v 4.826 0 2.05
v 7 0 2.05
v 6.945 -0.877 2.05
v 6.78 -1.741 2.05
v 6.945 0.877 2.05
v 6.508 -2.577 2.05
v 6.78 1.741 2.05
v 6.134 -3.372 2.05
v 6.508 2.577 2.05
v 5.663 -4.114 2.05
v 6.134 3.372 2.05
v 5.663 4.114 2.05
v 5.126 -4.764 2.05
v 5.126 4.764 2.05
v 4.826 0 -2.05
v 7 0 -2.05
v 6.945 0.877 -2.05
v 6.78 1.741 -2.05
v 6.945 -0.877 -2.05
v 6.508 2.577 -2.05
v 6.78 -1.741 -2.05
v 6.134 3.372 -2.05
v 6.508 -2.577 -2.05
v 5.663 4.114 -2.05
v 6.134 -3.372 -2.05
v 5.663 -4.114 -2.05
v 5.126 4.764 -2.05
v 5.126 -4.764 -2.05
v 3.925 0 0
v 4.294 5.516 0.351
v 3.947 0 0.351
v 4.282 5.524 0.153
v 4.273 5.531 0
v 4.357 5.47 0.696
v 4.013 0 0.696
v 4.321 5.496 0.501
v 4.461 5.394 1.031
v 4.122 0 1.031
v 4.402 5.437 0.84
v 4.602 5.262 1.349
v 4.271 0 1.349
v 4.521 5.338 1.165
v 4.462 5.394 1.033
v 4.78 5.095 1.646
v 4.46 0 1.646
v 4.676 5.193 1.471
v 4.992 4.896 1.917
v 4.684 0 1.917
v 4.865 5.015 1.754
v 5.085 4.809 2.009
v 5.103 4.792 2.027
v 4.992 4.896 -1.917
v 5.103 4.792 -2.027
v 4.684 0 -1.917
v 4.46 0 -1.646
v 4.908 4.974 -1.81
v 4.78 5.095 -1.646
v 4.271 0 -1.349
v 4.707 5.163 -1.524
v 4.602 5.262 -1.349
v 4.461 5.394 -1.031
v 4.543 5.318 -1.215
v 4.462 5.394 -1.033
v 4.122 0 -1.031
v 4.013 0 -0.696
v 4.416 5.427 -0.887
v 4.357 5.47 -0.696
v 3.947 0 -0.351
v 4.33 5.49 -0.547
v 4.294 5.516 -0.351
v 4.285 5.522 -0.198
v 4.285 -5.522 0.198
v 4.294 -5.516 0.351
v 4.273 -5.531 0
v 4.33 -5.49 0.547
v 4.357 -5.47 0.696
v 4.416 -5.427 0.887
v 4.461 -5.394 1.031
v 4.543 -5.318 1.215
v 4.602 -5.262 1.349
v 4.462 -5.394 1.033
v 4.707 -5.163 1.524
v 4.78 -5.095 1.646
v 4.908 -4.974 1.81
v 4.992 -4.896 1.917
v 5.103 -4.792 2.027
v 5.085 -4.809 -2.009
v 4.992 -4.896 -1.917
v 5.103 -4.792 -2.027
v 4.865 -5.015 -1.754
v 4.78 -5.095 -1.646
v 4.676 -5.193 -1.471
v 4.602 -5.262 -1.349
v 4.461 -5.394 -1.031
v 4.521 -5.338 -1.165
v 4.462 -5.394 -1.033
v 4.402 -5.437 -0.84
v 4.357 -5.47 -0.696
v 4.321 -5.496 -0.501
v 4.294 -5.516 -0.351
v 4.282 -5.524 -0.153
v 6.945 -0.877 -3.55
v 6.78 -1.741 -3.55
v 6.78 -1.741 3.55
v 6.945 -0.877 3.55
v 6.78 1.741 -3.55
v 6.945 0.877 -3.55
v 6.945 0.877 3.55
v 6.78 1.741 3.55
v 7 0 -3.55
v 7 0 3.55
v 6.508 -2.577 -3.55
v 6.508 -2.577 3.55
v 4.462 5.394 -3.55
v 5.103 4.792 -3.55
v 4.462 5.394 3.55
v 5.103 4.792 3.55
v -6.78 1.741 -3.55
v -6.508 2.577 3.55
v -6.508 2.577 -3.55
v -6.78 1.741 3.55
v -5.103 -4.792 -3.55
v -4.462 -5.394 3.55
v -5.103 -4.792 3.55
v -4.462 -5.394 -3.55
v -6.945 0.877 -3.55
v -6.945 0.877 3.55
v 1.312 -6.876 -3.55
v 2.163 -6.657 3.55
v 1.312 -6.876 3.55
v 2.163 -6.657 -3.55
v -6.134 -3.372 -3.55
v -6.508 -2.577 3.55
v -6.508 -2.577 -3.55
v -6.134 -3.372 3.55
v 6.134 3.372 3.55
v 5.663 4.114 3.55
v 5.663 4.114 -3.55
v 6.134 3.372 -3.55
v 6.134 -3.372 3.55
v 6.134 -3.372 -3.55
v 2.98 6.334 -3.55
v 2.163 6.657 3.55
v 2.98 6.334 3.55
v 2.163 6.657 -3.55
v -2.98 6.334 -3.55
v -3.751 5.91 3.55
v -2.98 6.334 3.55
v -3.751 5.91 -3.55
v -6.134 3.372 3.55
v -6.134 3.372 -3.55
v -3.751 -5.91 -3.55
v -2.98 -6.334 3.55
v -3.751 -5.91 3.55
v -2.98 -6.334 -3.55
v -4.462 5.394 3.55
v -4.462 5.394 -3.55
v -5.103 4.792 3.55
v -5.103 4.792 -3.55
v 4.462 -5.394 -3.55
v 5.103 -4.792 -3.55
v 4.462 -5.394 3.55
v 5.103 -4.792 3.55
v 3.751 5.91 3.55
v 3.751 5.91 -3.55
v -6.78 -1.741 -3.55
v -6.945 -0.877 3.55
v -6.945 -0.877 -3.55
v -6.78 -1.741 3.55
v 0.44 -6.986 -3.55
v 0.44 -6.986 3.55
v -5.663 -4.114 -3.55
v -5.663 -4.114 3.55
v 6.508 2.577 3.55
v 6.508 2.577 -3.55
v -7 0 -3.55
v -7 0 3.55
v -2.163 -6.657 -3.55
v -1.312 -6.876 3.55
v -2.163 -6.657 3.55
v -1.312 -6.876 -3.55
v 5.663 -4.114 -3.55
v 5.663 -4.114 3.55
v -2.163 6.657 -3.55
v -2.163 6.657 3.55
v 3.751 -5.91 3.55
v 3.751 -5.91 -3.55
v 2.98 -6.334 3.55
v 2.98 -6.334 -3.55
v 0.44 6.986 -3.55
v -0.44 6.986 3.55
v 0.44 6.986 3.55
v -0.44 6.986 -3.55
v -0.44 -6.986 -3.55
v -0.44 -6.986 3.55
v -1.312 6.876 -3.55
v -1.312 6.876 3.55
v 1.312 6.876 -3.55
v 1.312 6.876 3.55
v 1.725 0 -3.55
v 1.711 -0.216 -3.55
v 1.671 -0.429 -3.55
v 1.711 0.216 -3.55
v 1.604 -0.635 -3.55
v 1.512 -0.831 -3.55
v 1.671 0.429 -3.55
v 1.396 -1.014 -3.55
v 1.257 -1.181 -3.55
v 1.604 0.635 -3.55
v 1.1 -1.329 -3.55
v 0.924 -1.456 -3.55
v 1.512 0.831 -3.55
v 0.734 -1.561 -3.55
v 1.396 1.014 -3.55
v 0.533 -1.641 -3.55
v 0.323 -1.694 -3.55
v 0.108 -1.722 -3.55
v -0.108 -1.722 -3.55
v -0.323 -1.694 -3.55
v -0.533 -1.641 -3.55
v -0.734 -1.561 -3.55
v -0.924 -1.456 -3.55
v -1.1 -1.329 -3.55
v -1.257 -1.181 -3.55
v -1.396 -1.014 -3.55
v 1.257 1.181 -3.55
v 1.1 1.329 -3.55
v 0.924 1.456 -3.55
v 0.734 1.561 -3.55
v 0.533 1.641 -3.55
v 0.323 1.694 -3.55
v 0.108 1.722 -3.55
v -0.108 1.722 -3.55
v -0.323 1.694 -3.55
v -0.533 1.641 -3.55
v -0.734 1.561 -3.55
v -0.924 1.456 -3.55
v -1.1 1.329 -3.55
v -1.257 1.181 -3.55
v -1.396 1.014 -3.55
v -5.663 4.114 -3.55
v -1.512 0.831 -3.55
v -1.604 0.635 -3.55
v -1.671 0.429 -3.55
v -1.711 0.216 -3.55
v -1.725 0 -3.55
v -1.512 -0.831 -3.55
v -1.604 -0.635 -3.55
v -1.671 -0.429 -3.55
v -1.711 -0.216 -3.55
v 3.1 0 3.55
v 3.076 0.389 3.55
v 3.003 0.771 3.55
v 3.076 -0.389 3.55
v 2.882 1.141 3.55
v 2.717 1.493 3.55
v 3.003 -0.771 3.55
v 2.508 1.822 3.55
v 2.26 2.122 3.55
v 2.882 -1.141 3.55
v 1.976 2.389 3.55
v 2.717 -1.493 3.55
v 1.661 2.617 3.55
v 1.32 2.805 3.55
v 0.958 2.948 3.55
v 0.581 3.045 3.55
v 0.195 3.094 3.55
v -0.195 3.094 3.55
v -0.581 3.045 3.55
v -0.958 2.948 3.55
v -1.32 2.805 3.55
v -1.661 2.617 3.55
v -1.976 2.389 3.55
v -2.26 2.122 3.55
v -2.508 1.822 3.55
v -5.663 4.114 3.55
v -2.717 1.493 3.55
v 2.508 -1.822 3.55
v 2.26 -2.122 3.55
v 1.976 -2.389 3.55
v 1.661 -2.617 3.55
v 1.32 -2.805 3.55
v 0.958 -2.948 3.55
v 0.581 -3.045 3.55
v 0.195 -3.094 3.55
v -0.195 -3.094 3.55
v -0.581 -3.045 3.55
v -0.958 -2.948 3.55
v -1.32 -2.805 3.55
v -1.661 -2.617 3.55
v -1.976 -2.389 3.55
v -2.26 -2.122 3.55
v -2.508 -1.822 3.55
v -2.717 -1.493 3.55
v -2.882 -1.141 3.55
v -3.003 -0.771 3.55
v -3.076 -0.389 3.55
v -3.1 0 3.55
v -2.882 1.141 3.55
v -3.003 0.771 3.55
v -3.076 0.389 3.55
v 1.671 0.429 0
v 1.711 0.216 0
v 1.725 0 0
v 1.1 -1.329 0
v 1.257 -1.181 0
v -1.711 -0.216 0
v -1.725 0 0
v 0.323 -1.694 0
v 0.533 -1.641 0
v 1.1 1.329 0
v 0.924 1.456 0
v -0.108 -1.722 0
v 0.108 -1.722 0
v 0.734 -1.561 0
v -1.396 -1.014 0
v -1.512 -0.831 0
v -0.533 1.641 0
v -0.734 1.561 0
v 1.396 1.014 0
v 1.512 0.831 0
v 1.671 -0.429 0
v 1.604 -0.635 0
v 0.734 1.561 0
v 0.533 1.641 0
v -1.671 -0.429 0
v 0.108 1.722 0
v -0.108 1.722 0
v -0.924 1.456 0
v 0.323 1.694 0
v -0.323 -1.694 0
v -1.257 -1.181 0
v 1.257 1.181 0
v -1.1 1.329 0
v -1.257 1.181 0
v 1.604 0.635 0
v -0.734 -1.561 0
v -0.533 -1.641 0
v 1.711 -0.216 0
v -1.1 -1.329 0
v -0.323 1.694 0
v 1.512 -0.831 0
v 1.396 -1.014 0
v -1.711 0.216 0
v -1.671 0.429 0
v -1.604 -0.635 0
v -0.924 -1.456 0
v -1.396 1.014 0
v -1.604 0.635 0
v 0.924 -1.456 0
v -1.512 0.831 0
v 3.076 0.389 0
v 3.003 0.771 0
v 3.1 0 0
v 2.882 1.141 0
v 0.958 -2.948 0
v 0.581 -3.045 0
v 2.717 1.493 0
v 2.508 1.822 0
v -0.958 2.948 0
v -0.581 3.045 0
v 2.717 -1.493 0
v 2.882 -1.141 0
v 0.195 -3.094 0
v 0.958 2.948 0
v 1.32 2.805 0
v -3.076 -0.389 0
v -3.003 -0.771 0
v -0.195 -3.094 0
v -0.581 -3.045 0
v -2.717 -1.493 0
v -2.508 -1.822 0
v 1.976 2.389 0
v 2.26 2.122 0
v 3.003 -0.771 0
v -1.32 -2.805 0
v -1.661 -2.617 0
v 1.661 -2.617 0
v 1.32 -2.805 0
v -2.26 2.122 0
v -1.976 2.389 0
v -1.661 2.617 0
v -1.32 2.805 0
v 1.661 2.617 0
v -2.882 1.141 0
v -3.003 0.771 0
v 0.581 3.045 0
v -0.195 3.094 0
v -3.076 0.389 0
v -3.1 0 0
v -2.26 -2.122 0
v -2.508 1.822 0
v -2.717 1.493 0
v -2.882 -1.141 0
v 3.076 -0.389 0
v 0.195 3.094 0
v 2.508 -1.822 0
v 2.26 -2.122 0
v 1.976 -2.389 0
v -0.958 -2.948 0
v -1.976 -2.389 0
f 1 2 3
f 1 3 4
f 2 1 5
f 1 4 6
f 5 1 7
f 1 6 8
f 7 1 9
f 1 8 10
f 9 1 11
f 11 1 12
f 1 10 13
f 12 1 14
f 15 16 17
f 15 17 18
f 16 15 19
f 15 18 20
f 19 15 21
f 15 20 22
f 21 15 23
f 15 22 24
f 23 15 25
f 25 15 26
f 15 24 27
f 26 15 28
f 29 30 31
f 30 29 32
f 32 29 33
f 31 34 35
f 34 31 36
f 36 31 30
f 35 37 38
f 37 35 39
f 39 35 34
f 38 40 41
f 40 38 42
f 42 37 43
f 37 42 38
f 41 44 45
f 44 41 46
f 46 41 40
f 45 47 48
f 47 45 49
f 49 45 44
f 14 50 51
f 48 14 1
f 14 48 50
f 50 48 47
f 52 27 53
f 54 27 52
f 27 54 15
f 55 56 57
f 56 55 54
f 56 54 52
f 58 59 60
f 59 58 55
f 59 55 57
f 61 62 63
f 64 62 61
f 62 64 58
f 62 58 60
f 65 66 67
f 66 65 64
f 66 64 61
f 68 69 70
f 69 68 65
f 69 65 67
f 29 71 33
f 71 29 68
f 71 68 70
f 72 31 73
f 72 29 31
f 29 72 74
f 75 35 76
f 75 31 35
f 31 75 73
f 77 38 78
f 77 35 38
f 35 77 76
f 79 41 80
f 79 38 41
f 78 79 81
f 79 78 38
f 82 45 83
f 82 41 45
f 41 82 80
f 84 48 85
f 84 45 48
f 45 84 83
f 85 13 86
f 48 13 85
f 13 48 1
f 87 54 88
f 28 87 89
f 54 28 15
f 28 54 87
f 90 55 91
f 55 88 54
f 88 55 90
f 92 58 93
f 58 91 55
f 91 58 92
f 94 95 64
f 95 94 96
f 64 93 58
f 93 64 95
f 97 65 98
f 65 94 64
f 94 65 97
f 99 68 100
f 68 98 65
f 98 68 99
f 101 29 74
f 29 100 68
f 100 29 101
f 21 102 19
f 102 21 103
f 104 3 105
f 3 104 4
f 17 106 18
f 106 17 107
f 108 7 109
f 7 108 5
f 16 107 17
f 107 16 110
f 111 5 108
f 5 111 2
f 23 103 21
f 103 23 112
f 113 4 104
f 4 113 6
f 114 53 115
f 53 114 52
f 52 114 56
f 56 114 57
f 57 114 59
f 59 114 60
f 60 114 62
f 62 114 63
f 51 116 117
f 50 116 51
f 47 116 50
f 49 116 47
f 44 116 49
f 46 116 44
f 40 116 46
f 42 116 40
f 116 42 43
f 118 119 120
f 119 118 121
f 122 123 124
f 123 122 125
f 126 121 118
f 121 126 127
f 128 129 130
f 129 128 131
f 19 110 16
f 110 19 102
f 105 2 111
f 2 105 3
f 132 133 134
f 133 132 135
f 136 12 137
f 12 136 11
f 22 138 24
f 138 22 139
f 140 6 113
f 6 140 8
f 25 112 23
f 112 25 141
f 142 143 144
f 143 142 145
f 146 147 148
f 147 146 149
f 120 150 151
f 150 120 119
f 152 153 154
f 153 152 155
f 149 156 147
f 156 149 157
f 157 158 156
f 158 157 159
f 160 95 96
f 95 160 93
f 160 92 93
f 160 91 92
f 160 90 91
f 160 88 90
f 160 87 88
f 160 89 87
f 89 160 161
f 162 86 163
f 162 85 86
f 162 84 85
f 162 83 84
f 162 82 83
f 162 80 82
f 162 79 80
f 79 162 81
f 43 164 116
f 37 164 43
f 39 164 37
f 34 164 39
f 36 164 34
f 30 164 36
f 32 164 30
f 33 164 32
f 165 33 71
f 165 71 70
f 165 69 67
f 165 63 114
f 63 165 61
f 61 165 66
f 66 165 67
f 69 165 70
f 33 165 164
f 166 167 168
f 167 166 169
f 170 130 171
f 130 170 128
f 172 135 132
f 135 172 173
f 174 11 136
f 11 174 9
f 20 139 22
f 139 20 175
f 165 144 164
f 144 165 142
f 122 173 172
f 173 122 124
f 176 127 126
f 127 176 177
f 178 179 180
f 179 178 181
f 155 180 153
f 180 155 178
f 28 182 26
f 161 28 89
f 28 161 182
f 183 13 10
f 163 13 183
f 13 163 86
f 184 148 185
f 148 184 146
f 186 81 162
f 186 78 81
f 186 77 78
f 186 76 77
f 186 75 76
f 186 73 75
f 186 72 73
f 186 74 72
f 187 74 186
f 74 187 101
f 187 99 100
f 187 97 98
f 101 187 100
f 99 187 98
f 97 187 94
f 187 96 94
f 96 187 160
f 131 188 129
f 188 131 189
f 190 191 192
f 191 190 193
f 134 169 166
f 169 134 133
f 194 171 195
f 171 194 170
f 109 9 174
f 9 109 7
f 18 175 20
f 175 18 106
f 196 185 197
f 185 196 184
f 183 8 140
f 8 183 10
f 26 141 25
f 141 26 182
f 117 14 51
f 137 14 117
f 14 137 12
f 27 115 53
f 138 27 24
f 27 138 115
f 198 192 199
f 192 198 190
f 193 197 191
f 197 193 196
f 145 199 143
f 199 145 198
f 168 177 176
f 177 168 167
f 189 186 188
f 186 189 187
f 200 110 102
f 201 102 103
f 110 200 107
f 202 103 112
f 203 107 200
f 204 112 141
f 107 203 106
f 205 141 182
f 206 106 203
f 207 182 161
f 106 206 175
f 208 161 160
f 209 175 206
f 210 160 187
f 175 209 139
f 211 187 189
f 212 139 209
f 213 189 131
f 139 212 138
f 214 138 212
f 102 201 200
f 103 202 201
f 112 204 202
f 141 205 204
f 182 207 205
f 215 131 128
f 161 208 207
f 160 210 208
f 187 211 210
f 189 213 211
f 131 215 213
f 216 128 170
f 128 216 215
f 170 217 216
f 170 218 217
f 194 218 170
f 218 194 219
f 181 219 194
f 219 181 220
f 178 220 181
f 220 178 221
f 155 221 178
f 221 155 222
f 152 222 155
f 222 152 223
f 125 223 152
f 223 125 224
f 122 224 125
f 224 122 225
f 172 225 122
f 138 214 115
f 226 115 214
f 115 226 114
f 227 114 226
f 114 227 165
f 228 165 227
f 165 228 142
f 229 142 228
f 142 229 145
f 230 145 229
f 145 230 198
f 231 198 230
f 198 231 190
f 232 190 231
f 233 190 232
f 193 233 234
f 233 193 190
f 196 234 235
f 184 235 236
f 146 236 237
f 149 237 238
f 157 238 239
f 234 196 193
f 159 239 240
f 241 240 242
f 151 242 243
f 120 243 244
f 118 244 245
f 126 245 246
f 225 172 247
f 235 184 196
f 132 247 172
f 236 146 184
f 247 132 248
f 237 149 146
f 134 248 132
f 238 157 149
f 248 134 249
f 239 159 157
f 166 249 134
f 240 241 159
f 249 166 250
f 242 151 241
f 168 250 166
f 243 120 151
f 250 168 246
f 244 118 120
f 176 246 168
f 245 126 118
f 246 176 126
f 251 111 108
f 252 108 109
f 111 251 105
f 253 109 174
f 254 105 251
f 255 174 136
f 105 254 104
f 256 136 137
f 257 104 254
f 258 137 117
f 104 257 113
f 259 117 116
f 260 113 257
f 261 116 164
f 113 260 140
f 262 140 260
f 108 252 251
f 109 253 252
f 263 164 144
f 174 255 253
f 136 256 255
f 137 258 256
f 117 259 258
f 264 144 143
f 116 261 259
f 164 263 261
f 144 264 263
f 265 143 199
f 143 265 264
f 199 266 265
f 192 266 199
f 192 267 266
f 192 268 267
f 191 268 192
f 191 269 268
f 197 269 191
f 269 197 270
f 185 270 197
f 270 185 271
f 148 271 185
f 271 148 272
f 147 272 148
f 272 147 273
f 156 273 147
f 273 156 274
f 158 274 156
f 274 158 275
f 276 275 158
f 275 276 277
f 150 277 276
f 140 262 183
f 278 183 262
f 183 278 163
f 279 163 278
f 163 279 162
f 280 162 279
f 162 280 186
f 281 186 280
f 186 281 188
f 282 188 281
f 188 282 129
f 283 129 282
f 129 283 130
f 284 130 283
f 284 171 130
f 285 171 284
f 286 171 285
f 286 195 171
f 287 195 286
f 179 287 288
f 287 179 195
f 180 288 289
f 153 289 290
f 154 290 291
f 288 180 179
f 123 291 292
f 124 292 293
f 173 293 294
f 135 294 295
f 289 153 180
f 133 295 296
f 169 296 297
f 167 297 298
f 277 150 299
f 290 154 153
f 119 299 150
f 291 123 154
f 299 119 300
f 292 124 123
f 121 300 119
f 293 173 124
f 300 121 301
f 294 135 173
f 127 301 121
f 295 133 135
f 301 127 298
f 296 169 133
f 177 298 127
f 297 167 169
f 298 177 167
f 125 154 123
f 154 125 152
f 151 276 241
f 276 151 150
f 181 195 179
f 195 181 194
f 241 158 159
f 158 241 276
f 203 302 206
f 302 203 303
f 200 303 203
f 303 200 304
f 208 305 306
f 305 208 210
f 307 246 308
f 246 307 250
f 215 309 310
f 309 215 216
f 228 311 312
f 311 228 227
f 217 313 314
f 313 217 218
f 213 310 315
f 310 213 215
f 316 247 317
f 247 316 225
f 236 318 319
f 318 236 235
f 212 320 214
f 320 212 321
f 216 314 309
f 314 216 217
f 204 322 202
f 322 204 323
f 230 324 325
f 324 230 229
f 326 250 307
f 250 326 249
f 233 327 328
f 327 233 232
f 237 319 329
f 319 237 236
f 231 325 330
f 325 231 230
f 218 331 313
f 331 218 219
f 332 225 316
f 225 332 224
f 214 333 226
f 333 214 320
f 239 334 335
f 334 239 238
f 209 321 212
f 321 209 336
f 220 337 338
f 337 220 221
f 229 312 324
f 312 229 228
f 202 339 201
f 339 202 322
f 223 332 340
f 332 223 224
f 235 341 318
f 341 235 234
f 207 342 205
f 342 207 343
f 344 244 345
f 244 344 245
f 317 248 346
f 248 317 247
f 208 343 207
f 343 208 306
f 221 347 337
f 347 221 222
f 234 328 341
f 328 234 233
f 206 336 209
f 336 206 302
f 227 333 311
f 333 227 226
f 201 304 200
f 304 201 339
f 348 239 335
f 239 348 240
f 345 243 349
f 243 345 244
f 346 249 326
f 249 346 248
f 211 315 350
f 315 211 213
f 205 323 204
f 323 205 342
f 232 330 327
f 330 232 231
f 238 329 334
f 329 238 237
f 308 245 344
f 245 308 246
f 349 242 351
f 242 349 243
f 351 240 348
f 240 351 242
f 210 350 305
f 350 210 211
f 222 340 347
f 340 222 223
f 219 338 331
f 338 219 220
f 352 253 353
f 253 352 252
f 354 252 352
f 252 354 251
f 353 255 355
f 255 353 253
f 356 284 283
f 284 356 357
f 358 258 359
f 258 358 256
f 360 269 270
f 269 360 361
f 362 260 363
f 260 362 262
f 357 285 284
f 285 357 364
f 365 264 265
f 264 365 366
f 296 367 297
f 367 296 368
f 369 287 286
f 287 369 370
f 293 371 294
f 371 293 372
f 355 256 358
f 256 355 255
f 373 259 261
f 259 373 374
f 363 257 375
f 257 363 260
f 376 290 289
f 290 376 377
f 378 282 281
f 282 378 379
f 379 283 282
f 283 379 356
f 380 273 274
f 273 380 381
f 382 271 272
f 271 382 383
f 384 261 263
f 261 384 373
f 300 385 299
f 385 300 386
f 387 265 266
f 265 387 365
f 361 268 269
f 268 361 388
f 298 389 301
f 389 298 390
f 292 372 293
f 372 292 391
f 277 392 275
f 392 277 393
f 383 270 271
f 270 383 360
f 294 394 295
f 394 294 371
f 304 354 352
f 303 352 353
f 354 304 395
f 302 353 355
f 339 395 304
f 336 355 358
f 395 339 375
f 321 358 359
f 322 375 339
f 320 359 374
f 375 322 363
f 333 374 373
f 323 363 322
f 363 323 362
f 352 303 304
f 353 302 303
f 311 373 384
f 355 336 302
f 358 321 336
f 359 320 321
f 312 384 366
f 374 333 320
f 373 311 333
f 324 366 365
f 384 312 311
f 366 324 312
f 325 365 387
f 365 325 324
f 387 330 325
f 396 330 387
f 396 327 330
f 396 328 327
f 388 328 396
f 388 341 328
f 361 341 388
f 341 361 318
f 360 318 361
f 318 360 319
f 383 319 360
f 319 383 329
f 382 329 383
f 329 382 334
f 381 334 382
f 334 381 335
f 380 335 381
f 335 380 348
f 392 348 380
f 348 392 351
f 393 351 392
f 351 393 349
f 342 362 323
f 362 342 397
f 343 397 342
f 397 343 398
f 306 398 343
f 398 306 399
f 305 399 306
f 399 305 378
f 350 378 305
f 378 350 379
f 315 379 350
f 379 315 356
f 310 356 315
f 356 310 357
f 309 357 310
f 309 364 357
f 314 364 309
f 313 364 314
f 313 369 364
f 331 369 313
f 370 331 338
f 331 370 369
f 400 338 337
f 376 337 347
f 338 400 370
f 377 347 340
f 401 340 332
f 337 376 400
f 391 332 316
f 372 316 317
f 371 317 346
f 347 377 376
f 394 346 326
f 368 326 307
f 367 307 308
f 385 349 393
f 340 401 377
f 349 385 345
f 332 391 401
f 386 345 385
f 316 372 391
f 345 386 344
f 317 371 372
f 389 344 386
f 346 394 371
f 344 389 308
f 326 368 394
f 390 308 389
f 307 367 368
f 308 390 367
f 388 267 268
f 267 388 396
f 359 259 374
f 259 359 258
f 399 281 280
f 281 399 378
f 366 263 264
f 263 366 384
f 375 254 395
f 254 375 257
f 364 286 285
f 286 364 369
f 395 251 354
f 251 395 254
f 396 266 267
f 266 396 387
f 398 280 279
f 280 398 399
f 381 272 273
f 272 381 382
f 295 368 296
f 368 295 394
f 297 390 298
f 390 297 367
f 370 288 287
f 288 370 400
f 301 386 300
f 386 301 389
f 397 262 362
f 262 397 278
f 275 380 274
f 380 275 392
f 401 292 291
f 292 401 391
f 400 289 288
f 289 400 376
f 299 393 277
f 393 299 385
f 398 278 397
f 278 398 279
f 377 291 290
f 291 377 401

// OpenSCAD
// file: configuration.scad
// Increase this if your slicer or printer make holes too tight.
extra_radius = 0.1;

// OD = outside diameter, corner to corner.
m3_nut_od = 6.1;
m3_nut_radius = m3_nut_od/2 + 0.2 + extra_radius;
m3_washer_radius = 3.5 + extra_radius;
m3_head_radius = 3 + extra_radius;

// Major diameter of metric 3mm thread.
m3_major = 2.85;
m3_radius = m3_major/2 + extra_radius;
m3_wide_radius = m3_major/2 + extra_radius + 0.2;

// Major diameter of metric 2.5mm thread.
m2_major = 2.4;
m2_radius = m2_major/2 + extra_radius;
m2_wide_radius = m2_major/2 + extra_radius + 0.2;

// NEMA17 stepper motors.
motor_shaft_diameter = 5;
motor_shaft_radius = motor_shaft_diameter/2 + extra_radius;

// Frame brackets. M3x8mm screws work best with 3.6 mm brackets.
thickness = 3.6;

// OpenBeam or Misumi. Currently only 15x15 mm, but there is a plan
// to make models more parametric and allow 20x20 mm in the future.
extrusion = 15;
extrusion_length = 240;

// HiWin, THK or Misumi
rail_width = 12;
rail_thickness = 8;

// Placement for the NEMA17 stepper motors.
motor_offset = 44;
motor_length = 47;

// Printer inner/outer dimmensions
inner_gap=27;				// distance between inner vertex cone corners
inner_offset=0.8;		// offset to fit the print into the printer frame
k_inner_side=extrusion_length + 2*(inner_gap-inner_offset);
k_inner_height=k_inner_side * sqrt(3) /2;
k_outer_radius=2*k_inner_height/3;
// main file
// borosilicate glass from http://goo.gl/btgYxZ

include <configuration.scad>;

glass_thickness=4.1;
tab_thickness=1.5;

height=2*tab_thickness + glass_thickness;

glass_radius=100;
glass_edge_radius=height/4;
lock_radius=7;

module glass_lock($fn=50) {
	difference() {
		cylinder(r=lock_radius, h=height, center=true);

		// screw hole
		cylinder(r=m3_wide_radius, h=height + 1, center=true);
		// screw head hole
		translate([0, 0, height/2]) 
			cylinder(r=m3_head_radius, h=height, center=true);	
	
		// edge
		translate([lock_radius+glass_radius, 0, 0]) 
			cylinder(r=glass_radius, h=2*glass_thickness+1, center=true);
		// glass insert
		intersection() {
			cube([lock_radius*2, lock_radius*2, glass_thickness], center=true);
			translate([lock_radius + glass_radius - glass_thickness/2, 0, 0]) 
				rotate_extrude(convexity=10, center=true)
					translate([glass_radius - glass_edge_radius, 0, 0])
						circle(r=2.8, center=true);
		}
	}
}

glass_lock();
